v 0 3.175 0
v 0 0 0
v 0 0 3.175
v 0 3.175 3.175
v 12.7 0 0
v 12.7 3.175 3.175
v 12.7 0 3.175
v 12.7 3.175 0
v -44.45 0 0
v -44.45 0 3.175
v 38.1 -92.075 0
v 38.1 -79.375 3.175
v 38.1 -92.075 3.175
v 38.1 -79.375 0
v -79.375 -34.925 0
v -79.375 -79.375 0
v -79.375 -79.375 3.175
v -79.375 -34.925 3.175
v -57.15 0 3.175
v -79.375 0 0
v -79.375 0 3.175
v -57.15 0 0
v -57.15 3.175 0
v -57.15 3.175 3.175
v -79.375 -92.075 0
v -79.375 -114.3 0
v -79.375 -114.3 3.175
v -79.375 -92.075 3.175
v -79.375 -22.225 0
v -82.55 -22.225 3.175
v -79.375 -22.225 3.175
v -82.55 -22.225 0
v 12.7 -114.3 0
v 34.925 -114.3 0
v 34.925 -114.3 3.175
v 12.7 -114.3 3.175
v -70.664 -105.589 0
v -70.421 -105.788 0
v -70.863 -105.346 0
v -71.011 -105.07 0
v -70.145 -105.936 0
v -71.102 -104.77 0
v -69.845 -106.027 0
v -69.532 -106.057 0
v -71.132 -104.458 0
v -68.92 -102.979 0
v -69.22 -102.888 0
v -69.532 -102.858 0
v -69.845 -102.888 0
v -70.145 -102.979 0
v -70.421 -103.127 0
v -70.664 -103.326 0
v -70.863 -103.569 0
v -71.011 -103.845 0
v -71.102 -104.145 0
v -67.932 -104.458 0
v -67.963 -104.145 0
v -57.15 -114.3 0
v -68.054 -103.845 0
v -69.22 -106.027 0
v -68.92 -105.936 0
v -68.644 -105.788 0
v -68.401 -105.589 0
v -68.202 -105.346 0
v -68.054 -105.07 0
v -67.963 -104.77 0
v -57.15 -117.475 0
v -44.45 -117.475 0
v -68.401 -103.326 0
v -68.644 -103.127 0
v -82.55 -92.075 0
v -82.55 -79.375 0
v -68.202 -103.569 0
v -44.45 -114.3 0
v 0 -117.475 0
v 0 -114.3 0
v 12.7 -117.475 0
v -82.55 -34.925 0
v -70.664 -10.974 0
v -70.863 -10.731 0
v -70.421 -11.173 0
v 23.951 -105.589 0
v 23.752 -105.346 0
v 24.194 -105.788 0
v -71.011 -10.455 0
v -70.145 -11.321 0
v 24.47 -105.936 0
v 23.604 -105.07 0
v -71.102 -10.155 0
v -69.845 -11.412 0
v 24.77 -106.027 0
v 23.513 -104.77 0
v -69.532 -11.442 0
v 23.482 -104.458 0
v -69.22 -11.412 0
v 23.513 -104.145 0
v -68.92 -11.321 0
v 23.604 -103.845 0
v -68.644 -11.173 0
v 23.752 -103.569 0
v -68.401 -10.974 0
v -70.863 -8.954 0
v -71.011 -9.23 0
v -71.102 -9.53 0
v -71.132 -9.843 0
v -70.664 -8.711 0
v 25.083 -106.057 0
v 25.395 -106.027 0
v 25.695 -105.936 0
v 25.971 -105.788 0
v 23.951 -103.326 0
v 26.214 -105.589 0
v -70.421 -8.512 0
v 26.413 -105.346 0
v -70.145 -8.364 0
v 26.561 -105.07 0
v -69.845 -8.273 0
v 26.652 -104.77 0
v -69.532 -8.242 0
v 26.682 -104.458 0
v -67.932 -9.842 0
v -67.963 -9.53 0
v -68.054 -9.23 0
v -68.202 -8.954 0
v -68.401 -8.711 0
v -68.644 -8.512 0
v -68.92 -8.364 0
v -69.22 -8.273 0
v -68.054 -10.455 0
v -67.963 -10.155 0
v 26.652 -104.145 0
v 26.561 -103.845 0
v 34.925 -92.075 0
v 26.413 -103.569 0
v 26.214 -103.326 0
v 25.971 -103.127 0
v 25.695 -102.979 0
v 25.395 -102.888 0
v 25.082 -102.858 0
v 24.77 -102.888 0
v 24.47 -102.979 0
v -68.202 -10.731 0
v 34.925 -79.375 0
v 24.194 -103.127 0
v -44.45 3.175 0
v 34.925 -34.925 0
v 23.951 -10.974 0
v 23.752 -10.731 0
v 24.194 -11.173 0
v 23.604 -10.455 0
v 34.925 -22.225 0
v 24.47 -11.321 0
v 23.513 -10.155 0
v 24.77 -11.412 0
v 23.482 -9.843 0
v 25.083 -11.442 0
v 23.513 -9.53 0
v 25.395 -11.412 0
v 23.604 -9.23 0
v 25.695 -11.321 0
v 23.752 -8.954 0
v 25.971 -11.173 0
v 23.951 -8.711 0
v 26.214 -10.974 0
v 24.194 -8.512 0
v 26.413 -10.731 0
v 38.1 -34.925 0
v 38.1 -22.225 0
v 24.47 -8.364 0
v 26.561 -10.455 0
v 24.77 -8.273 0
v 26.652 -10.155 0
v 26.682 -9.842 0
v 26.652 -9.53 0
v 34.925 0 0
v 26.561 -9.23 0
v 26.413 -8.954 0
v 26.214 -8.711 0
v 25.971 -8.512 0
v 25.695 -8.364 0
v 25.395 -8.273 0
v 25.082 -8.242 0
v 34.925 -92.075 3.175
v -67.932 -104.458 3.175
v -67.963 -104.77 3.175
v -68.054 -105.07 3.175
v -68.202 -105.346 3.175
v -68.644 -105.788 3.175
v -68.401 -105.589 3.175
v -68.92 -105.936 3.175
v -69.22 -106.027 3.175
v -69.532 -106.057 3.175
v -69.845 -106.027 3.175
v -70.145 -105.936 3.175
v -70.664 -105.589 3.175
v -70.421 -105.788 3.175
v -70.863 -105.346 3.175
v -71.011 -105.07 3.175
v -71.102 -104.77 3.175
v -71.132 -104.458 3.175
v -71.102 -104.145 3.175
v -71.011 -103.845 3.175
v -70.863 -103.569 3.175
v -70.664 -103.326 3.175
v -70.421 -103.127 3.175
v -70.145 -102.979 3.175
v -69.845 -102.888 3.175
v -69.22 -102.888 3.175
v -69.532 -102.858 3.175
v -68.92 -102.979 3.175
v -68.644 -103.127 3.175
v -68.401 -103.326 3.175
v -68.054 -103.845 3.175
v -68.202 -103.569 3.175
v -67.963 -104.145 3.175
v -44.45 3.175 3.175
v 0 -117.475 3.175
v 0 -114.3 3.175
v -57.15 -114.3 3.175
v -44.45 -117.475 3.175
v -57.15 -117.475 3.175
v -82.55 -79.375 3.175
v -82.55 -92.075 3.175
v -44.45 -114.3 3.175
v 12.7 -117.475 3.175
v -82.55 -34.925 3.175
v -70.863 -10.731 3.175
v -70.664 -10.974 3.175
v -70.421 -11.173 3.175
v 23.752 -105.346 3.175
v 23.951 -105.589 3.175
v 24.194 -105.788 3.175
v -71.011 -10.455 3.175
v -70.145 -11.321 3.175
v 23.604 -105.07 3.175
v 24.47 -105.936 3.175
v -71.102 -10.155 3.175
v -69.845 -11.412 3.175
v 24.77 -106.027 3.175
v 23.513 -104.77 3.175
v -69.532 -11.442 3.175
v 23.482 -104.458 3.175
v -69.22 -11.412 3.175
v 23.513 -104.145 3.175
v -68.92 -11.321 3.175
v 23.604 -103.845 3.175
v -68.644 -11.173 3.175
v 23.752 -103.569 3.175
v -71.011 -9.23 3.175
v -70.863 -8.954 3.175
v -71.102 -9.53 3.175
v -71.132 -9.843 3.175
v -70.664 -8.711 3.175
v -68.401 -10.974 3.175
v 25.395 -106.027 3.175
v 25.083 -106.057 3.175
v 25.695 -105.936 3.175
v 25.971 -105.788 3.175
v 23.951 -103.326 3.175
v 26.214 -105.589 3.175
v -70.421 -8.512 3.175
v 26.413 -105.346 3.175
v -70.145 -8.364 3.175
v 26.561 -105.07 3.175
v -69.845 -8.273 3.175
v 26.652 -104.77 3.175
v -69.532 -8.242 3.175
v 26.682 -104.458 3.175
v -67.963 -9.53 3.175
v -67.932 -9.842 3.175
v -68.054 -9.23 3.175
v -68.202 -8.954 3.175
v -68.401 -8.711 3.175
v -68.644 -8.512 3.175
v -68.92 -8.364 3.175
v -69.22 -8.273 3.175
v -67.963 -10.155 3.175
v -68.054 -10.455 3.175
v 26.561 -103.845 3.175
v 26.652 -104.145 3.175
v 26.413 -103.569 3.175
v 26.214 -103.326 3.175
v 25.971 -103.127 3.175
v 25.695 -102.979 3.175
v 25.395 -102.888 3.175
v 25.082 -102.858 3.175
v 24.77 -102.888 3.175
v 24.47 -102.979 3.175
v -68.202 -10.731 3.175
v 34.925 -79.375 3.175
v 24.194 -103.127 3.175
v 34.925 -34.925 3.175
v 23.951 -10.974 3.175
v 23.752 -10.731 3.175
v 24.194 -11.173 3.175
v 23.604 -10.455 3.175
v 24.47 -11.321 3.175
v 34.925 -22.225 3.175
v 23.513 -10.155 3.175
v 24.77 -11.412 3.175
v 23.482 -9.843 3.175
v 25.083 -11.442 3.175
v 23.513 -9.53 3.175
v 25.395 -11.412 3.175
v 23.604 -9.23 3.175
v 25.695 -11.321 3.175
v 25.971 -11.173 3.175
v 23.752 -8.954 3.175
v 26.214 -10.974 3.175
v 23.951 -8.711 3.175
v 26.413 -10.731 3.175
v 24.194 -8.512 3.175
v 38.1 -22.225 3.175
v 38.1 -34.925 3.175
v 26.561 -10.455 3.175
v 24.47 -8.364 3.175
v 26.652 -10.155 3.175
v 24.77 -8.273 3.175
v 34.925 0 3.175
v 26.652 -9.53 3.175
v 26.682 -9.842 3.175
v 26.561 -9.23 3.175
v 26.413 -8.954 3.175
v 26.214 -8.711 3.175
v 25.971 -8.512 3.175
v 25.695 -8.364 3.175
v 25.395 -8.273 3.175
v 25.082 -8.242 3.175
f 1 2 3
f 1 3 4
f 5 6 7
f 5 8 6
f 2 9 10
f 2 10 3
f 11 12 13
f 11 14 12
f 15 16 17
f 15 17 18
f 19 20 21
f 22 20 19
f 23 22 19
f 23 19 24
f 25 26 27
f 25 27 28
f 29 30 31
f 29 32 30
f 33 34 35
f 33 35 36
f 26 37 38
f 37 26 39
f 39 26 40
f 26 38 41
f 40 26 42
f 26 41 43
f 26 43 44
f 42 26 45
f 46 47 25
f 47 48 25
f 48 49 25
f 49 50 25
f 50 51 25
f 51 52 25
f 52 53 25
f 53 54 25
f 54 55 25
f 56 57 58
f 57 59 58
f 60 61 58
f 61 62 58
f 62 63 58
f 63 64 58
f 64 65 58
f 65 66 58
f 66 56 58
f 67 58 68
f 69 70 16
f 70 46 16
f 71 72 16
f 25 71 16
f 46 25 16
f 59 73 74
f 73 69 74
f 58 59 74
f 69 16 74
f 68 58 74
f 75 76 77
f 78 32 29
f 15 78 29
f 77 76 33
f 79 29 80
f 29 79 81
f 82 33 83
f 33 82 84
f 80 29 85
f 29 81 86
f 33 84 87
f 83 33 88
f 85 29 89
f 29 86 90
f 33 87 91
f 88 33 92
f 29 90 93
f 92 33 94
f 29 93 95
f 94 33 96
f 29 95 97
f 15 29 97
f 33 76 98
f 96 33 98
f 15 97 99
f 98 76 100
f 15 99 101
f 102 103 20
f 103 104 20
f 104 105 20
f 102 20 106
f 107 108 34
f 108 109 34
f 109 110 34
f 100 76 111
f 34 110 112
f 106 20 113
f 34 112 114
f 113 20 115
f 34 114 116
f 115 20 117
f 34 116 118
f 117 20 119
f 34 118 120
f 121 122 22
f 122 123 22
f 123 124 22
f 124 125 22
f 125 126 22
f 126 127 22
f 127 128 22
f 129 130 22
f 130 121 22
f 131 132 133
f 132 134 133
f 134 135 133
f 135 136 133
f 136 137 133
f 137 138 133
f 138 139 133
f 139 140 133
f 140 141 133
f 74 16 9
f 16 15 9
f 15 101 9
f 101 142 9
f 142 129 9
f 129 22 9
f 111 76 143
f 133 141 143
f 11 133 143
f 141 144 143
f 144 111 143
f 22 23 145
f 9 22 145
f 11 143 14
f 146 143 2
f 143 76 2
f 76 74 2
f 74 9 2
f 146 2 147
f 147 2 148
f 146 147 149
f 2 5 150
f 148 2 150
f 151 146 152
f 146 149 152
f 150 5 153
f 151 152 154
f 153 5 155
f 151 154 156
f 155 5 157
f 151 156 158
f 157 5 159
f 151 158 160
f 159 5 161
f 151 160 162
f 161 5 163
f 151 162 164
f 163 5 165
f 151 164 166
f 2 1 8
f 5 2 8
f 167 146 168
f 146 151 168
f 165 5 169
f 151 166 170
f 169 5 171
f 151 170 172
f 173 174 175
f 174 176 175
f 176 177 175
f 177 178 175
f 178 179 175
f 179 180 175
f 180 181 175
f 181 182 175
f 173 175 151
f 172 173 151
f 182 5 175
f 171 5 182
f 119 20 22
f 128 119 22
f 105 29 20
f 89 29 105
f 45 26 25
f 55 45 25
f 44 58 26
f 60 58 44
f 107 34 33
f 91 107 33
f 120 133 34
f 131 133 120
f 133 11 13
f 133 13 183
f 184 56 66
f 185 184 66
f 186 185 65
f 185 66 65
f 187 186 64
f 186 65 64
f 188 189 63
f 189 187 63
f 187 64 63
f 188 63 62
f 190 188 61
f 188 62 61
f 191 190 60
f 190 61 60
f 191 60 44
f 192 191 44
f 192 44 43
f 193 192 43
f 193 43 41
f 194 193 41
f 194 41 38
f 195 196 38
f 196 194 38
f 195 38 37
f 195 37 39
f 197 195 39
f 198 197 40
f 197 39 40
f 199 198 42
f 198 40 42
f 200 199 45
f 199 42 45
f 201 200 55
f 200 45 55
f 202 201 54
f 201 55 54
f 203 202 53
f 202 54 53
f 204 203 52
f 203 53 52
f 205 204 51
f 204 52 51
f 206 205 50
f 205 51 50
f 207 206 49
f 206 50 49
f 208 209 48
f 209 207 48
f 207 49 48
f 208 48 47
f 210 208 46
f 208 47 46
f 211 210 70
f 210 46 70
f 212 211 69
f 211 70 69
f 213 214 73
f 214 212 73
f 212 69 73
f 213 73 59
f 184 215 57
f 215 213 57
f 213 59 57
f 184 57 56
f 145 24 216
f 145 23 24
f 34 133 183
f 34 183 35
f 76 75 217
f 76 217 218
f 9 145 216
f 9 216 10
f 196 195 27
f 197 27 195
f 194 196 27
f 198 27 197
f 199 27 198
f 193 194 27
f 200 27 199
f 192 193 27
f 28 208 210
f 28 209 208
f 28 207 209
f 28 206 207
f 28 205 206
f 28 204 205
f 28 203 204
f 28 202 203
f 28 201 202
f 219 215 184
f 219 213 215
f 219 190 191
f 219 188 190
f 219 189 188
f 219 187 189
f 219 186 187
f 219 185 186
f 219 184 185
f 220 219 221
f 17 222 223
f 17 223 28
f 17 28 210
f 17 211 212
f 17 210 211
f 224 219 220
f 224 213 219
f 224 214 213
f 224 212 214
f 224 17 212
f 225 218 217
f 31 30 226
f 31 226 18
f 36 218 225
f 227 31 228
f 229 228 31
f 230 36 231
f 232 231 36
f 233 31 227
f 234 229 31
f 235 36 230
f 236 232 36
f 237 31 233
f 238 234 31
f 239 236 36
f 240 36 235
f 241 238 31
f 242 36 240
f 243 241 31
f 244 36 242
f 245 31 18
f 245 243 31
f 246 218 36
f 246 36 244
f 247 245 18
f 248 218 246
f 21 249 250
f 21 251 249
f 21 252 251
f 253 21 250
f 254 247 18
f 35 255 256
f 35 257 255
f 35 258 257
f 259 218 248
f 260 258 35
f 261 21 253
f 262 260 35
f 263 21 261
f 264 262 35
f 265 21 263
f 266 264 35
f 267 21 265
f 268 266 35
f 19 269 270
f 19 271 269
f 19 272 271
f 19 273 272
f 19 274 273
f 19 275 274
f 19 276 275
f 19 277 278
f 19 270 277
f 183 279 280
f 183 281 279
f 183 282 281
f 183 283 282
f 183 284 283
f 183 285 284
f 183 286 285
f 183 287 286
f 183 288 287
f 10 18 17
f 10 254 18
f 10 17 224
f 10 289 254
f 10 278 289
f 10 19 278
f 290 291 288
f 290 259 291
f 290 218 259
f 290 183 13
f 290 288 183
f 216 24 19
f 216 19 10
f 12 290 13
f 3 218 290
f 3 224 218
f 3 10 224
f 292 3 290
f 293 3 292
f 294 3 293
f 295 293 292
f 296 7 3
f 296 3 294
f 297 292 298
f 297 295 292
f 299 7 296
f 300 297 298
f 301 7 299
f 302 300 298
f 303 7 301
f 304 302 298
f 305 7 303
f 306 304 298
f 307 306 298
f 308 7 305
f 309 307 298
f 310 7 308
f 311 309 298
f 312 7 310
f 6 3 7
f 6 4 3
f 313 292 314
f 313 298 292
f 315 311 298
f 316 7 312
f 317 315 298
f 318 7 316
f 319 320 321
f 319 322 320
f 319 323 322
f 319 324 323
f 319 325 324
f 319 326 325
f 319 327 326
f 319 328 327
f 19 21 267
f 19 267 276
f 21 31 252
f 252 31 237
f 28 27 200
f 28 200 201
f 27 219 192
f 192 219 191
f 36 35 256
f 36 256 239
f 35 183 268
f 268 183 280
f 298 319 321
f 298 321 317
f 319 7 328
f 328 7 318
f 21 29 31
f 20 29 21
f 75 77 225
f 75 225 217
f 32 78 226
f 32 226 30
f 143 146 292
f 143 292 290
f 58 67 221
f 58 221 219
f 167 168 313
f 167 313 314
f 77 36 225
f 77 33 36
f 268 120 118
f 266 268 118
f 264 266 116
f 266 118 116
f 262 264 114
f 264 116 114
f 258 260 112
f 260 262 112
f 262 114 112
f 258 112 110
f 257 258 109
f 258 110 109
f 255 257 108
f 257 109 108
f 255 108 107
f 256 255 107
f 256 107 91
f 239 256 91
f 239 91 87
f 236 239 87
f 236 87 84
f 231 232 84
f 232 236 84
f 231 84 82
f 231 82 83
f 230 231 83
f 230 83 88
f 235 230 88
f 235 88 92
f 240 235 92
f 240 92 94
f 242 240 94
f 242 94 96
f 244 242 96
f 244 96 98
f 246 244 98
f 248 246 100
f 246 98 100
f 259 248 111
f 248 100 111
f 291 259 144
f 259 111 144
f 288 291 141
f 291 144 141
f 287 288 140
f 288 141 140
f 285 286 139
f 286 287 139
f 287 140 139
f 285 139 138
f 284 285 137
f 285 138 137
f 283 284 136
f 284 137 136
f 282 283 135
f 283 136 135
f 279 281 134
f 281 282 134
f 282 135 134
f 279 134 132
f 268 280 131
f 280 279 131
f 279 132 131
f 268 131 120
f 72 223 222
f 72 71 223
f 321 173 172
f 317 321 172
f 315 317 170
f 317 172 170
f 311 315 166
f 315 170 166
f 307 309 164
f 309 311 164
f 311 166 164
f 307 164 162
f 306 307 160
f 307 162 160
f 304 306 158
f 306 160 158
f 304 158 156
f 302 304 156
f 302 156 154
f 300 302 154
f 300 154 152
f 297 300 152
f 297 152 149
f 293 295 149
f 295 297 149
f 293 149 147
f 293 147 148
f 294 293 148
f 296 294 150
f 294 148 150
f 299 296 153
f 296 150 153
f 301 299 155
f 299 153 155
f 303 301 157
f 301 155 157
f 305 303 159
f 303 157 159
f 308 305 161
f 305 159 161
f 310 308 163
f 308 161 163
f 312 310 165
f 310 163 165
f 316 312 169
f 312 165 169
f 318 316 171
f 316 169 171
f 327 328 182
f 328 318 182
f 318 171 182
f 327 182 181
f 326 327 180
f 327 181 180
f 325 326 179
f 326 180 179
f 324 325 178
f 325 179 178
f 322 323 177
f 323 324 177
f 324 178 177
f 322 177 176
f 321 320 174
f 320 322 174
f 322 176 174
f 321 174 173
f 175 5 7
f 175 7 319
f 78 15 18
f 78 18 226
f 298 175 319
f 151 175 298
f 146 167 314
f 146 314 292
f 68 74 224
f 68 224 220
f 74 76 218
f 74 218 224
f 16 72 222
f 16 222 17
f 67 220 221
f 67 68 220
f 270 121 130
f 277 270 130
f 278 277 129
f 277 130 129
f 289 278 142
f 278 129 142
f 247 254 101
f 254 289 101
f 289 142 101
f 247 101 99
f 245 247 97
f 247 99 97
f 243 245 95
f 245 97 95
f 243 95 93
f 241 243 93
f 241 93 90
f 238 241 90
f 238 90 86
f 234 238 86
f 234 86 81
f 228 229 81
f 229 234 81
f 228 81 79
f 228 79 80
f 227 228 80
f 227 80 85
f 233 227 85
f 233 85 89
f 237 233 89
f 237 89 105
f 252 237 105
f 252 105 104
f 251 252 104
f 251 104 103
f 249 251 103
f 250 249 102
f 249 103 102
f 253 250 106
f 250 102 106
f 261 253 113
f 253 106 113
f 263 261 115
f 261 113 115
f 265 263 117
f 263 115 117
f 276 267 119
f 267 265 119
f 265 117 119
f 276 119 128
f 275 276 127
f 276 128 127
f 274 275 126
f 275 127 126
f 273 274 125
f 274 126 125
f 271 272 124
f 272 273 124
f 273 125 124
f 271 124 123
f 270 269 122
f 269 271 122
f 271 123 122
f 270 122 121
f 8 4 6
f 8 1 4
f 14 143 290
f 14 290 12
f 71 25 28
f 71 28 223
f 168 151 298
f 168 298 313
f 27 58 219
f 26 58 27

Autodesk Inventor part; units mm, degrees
ref_plane "YZ Plane" through (0, 0, 0) normal (1, 0, 0) x (0, 1, 0)
ref_plane "XZ Plane" through (0, 0, 0) normal (0, 1, 0) x (-1, 0, 0)
ref_plane "XY Plane" through (0, 0, 0) normal (0, 0, 1) x (1, 0, 0)
sketch "Sketch1" plane through (0, 0, 0) normal (0, 0, 1) x (1, 0, 0)
  line L0 (34.925, -114.3) -> (12.7, -114.3) projected
  line L1 (34.925, -92.075) -> (34.925, -114.3) projected
  line L2 (38.1, -92.075) -> (34.925, -92.075) projected
  line L3 (38.1, -79.375) -> (38.1, -92.075) projected
  line L4 (34.925, -79.375) -> (38.1, -79.375) projected
  line L5 (34.925, -34.925) -> (34.925, -79.375) projected
  line L6 (38.1, -34.925) -> (34.925, -34.925) projected
  line L7 (38.1, -22.225) -> (38.1, -34.925) projected
  line L8 (34.925, -22.225) -> (38.1, -22.225) projected
  line L9 (34.925, 0) -> (34.925, -22.225) projected
  line L10 (12.7, 0) -> (34.925, 0) projected
  line L11 (12.7, 3.175) -> (12.7, 0) projected
  line L12 (0, 3.175) -> (12.7, 3.175) projected
  line L13 (0, 0) -> (0, 3.175) projected
  line L14 (-44.45, 0) -> (0, 0) projected
  line L15 (-44.45, 3.175) -> (-44.45, 0) projected
  line L16 (-57.15, 3.175) -> (-44.45, 3.175) projected
  line L17 (-57.15, 0) -> (-57.15, 3.175) projected
  line L18 (-79.375, 0) -> (-57.15, 0) projected
  line L19 (-79.375, -22.225) -> (-79.375, 0) projected
  line L20 (-82.55, -22.225) -> (-79.375, -22.225) projected
  line L21 (-82.55, -34.925) -> (-82.55, -22.225) projected
  line L22 (-79.375, -34.925) -> (-82.55, -34.925) projected
  line L23 (-79.375, -79.375) -> (-79.375, -34.925) projected
  line L24 (-82.55, -79.375) -> (-79.375, -79.375) projected
  line L25 (-82.55, -92.075) -> (-82.55, -79.375) projected
  line L26 (-79.375, -92.075) -> (-82.55, -92.075) projected
  line L27 (-79.375, -114.3) -> (-79.375, -92.075) projected
  line L28 (-57.15, -114.3) -> (-79.375, -114.3) projected
  line L29 (-57.15, -117.475) -> (-57.15, -114.3) projected
  line L30 (-44.45, -117.475) -> (-57.15, -117.475) projected
  line L31 (-44.45, -114.3) -> (-44.45, -117.475) projected
  line L32 (0, -114.3) -> (-44.45, -114.3) projected
  line L33 (0, -117.475) -> (0, -114.3) projected
  line L34 (12.7, -117.475) -> (0, -117.475) projected
  line L35 (12.7, -114.3) -> (12.7, -117.475) projected
  circle A0 centre (-69.5325, -9.8425) radius 1.6 projected
  circle A1 centre (25.0825, -9.8425) radius 1.6 projected
  circle A2 centre (25.0825, -104.4575) radius 1.6 projected
  circle A3 centre (-69.5325, -104.4575) radius 1.6 projected
extrude "Extrusion1" add sketch "Sketch1" along normal blind 3.175
properties part number "Back" material "ABS Plastic"
